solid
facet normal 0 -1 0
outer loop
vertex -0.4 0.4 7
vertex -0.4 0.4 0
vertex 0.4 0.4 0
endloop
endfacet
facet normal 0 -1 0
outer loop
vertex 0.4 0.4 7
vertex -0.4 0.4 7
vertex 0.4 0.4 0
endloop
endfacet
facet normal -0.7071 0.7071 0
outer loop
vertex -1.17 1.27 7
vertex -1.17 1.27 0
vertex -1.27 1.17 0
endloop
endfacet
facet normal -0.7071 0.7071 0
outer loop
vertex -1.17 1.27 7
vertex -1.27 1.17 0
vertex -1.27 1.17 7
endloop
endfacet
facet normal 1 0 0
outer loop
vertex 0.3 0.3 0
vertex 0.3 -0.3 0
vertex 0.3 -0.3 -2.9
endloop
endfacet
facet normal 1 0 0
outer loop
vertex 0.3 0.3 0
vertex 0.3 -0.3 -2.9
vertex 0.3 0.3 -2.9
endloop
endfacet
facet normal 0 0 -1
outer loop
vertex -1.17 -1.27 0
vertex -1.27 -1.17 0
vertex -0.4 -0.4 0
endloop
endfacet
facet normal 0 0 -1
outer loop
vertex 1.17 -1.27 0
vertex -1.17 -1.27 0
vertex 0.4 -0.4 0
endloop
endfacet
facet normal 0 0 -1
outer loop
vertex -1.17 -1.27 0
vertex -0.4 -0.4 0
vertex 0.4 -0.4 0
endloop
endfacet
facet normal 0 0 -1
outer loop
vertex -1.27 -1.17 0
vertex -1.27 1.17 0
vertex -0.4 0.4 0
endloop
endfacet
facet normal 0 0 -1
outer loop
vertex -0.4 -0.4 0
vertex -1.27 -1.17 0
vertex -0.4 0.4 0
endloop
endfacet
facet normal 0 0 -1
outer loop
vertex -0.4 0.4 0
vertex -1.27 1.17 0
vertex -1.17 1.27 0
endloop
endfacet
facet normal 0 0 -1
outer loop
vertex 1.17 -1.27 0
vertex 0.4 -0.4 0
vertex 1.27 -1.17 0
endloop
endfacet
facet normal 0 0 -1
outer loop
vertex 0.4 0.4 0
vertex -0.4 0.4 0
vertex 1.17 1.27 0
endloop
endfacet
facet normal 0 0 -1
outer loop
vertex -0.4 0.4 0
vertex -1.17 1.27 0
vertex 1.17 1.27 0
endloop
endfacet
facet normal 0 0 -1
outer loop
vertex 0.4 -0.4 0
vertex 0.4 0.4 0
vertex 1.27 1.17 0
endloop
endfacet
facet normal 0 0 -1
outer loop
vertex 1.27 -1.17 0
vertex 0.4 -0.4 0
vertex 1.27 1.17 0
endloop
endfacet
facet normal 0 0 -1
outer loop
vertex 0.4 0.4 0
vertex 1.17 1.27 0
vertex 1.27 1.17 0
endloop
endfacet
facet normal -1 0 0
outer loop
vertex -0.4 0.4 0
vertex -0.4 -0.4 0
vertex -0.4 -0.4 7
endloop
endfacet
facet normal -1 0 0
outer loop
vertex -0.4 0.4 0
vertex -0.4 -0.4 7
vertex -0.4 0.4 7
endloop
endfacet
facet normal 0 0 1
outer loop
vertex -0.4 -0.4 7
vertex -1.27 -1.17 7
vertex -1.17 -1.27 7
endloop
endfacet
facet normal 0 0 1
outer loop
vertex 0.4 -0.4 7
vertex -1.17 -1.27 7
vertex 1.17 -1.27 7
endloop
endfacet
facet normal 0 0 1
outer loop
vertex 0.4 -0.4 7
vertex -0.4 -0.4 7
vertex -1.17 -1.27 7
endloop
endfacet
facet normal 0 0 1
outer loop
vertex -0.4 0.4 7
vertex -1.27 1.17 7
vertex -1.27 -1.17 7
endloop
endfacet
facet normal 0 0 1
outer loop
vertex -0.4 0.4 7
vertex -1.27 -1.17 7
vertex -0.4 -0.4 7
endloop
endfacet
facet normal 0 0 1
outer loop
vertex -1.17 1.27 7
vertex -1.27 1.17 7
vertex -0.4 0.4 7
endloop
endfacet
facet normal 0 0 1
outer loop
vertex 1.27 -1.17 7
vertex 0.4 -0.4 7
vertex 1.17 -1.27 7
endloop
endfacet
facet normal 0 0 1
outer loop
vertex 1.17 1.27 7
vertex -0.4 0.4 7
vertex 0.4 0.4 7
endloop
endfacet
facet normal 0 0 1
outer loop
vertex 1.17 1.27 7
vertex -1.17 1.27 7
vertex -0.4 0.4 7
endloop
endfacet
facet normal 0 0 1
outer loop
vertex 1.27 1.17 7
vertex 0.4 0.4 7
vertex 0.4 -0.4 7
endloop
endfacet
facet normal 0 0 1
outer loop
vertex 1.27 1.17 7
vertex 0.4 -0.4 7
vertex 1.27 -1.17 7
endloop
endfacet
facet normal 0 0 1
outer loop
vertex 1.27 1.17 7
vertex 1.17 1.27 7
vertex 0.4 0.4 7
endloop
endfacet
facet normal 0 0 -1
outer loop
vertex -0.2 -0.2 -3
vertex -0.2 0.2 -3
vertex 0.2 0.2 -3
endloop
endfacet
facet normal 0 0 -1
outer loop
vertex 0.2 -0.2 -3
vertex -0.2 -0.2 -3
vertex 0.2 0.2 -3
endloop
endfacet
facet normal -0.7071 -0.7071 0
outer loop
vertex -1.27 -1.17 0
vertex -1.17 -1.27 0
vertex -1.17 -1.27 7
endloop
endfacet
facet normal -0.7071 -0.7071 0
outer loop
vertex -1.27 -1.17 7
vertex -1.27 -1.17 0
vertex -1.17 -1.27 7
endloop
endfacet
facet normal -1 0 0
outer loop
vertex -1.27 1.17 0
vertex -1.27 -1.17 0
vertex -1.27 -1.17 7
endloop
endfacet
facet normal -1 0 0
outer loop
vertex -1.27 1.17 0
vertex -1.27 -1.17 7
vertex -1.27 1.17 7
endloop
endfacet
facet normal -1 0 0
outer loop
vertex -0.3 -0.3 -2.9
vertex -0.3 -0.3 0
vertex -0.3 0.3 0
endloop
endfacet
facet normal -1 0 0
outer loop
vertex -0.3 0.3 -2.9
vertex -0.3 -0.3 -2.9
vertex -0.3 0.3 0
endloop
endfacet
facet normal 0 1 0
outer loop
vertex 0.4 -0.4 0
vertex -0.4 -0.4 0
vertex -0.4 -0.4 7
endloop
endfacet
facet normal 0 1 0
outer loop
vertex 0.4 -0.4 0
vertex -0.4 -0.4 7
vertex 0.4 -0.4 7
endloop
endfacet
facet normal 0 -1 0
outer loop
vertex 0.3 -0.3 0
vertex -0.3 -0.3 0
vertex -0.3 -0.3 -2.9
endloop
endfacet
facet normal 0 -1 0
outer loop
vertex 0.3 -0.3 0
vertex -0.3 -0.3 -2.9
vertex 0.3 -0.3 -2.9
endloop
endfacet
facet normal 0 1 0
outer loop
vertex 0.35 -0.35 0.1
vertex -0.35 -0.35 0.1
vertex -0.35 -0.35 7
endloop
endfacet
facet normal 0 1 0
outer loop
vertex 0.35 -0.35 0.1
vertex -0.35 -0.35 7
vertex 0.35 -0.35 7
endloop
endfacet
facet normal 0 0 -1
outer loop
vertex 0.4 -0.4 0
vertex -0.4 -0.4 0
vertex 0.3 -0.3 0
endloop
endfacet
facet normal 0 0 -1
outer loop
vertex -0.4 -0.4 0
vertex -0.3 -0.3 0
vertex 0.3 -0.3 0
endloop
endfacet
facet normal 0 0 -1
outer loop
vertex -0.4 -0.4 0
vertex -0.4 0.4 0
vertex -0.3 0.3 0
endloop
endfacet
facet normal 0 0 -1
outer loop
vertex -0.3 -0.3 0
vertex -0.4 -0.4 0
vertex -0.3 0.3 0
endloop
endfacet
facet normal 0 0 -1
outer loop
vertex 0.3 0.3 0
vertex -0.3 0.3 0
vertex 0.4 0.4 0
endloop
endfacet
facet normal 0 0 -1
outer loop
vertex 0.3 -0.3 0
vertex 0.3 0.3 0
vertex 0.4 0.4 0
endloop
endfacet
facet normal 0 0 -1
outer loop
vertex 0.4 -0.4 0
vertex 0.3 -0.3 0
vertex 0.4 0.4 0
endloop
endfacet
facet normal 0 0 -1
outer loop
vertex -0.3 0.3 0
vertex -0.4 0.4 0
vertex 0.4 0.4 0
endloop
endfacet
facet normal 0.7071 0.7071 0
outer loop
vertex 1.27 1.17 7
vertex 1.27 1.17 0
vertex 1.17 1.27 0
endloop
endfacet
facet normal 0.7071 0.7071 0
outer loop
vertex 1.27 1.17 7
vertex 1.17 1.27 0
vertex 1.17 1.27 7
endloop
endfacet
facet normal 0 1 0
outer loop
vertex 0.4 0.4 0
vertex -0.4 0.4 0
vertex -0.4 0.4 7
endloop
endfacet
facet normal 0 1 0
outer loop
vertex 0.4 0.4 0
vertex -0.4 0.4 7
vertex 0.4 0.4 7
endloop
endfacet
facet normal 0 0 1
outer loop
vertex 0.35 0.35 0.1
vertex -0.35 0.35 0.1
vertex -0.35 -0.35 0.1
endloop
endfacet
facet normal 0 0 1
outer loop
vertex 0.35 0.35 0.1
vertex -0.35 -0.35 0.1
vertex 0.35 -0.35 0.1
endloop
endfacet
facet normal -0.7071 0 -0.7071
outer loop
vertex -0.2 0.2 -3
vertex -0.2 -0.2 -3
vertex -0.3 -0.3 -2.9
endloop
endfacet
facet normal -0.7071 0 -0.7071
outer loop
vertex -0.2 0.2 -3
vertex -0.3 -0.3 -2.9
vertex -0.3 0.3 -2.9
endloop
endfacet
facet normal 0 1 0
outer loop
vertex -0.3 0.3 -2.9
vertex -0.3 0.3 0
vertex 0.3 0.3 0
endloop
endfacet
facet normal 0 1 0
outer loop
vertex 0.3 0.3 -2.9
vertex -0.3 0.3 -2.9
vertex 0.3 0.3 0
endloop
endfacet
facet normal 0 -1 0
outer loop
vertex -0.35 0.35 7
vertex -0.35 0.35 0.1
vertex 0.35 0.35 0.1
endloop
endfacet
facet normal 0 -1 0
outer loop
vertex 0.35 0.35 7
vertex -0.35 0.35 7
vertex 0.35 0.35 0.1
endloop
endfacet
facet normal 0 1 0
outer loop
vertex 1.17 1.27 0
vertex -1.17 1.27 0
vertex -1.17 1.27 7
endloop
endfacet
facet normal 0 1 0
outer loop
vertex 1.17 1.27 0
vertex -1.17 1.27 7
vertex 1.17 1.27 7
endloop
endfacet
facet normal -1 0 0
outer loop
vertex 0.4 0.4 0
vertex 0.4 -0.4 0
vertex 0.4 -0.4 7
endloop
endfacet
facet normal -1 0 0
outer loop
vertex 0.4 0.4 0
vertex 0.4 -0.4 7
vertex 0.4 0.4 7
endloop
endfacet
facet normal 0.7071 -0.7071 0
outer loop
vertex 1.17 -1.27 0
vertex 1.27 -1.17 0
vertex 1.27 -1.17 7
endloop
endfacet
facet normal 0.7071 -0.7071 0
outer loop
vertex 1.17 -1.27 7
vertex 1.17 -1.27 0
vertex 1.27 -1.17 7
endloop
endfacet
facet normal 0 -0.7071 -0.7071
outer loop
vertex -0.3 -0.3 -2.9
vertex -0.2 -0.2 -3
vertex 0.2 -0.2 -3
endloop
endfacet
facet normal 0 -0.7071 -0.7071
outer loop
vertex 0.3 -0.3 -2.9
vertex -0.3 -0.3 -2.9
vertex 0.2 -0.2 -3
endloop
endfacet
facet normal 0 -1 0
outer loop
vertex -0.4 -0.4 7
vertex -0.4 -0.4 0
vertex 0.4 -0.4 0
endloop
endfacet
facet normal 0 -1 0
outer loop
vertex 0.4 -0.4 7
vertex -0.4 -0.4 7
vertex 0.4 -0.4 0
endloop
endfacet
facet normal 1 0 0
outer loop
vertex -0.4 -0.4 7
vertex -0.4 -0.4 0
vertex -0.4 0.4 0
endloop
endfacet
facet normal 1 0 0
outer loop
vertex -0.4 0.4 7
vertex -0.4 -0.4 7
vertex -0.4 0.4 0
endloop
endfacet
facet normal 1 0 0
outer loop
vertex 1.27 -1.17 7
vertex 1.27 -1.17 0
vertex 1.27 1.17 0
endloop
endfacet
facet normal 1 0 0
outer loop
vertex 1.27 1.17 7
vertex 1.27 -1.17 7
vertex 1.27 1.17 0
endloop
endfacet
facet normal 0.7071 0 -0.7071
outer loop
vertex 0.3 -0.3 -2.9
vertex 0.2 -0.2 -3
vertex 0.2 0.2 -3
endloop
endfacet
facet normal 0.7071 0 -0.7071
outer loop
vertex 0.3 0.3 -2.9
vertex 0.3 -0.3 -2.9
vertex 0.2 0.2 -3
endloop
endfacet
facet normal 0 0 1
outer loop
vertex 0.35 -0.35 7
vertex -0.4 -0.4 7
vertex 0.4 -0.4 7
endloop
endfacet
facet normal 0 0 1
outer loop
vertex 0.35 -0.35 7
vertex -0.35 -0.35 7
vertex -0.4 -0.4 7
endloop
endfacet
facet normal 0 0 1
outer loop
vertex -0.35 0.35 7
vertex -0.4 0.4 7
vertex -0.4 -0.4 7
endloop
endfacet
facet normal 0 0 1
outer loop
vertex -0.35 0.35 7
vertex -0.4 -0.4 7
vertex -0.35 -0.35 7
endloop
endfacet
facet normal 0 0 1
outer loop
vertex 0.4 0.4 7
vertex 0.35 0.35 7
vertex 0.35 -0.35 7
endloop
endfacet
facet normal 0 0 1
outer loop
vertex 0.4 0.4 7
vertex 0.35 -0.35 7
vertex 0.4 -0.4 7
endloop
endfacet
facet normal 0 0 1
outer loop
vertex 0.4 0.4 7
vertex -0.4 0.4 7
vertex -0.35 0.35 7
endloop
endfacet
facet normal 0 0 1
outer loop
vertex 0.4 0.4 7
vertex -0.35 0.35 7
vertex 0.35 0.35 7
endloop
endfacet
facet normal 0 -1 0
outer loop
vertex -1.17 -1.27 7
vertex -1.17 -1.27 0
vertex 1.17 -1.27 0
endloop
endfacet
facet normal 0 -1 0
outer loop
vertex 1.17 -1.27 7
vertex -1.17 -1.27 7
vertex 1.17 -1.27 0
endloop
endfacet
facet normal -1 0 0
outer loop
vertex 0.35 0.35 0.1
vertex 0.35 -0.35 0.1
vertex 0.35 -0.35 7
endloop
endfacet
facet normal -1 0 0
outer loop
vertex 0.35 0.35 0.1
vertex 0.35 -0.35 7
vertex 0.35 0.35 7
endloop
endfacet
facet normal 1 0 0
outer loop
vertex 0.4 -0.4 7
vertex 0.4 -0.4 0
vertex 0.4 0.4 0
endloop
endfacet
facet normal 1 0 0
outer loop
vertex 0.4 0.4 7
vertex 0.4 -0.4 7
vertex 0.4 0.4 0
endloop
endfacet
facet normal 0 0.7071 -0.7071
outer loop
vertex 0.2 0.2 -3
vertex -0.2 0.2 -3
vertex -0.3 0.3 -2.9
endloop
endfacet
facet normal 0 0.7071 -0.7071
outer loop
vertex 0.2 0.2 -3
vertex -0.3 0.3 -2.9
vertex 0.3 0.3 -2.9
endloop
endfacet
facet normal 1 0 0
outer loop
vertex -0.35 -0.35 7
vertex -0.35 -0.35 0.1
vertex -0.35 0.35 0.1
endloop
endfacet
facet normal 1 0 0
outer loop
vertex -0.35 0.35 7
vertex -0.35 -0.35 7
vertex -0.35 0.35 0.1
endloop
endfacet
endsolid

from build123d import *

# Parameters (mm, degrees)
F0_W          = 2.54
F0_H          = 2.54
F0_W_2        = 0.8
F0_H_2        = 0.8
F1_DEPTH      = 7
F2_SIZE       = 0.1
F3_W          = 0.8
F3_H          = 0.8
F3_W_2        = 0.7
F3_H_2        = 0.7
F4_DEPTH      = 7
F3_W_3        = 0.6
F3_H_3        = 0.6
F5_DEPTH      = 0.1
F6_DEPTH      = 3
F6_DEPTH_BACK = 0.1
F7_SIZE       = 0.1


with BuildPart() as f1:
    # F0 (on Top) → F1 (new body)
    with BuildSketch(Plane.XY):
        Rectangle(F0_W, F0_H)
        Rectangle(F0_W_2, F0_H_2, mode=Mode.SUBTRACT)
    extrude(amount=F1_DEPTH)

    # F2
    f2_edges = [f1.edges().sort_by_distance(p)[0] for p in [
        (1.27, -1.27, 3.5),
        (-1.27, -1.27, 3.5),
        (-1.27, 1.27, 3.5),
        (1.27, 1.27, 3.5),
    ]]
    chamfer(f2_edges, length=F2_SIZE)


with BuildPart() as f4:
    # F3 (on Top) → F4 (new body, through all)
    with BuildSketch(Plane.XY):
        Rectangle(F3_W, F3_H)
        Rectangle(F3_W_2, F3_H_2, mode=Mode.SUBTRACT)
    extrude(amount=F4_DEPTH)

    # F3 (on Top) → F5 (join)
    with BuildSketch(Plane.XY):
        Rectangle(F3_W_2, F3_H_2)
        Rectangle(F3_W_3, F3_H_3, mode=Mode.SUBTRACT)
    extrude(amount=F5_DEPTH)

    # F3 (on Top) → F6 (join, two sides)
    with BuildSketch(Plane.XY) as f6_sk:
        Rectangle(F3_W_3, F3_H_3)
    extrude(amount=-F6_DEPTH)
    extrude(f6_sk.sketch, amount=F6_DEPTH_BACK)

    # F7
    f7_edges = [f4.edges().sort_by_distance(p)[0] for p in [
        (0.3, 0, -3),
        (0, 0.3, -3),
        (-0.3, 0, -3),
        (0, -0.3, -3),
    ]]
    chamfer(f7_edges, length=F7_SIZE)


solid = Compound([f1.part, f4.part])
